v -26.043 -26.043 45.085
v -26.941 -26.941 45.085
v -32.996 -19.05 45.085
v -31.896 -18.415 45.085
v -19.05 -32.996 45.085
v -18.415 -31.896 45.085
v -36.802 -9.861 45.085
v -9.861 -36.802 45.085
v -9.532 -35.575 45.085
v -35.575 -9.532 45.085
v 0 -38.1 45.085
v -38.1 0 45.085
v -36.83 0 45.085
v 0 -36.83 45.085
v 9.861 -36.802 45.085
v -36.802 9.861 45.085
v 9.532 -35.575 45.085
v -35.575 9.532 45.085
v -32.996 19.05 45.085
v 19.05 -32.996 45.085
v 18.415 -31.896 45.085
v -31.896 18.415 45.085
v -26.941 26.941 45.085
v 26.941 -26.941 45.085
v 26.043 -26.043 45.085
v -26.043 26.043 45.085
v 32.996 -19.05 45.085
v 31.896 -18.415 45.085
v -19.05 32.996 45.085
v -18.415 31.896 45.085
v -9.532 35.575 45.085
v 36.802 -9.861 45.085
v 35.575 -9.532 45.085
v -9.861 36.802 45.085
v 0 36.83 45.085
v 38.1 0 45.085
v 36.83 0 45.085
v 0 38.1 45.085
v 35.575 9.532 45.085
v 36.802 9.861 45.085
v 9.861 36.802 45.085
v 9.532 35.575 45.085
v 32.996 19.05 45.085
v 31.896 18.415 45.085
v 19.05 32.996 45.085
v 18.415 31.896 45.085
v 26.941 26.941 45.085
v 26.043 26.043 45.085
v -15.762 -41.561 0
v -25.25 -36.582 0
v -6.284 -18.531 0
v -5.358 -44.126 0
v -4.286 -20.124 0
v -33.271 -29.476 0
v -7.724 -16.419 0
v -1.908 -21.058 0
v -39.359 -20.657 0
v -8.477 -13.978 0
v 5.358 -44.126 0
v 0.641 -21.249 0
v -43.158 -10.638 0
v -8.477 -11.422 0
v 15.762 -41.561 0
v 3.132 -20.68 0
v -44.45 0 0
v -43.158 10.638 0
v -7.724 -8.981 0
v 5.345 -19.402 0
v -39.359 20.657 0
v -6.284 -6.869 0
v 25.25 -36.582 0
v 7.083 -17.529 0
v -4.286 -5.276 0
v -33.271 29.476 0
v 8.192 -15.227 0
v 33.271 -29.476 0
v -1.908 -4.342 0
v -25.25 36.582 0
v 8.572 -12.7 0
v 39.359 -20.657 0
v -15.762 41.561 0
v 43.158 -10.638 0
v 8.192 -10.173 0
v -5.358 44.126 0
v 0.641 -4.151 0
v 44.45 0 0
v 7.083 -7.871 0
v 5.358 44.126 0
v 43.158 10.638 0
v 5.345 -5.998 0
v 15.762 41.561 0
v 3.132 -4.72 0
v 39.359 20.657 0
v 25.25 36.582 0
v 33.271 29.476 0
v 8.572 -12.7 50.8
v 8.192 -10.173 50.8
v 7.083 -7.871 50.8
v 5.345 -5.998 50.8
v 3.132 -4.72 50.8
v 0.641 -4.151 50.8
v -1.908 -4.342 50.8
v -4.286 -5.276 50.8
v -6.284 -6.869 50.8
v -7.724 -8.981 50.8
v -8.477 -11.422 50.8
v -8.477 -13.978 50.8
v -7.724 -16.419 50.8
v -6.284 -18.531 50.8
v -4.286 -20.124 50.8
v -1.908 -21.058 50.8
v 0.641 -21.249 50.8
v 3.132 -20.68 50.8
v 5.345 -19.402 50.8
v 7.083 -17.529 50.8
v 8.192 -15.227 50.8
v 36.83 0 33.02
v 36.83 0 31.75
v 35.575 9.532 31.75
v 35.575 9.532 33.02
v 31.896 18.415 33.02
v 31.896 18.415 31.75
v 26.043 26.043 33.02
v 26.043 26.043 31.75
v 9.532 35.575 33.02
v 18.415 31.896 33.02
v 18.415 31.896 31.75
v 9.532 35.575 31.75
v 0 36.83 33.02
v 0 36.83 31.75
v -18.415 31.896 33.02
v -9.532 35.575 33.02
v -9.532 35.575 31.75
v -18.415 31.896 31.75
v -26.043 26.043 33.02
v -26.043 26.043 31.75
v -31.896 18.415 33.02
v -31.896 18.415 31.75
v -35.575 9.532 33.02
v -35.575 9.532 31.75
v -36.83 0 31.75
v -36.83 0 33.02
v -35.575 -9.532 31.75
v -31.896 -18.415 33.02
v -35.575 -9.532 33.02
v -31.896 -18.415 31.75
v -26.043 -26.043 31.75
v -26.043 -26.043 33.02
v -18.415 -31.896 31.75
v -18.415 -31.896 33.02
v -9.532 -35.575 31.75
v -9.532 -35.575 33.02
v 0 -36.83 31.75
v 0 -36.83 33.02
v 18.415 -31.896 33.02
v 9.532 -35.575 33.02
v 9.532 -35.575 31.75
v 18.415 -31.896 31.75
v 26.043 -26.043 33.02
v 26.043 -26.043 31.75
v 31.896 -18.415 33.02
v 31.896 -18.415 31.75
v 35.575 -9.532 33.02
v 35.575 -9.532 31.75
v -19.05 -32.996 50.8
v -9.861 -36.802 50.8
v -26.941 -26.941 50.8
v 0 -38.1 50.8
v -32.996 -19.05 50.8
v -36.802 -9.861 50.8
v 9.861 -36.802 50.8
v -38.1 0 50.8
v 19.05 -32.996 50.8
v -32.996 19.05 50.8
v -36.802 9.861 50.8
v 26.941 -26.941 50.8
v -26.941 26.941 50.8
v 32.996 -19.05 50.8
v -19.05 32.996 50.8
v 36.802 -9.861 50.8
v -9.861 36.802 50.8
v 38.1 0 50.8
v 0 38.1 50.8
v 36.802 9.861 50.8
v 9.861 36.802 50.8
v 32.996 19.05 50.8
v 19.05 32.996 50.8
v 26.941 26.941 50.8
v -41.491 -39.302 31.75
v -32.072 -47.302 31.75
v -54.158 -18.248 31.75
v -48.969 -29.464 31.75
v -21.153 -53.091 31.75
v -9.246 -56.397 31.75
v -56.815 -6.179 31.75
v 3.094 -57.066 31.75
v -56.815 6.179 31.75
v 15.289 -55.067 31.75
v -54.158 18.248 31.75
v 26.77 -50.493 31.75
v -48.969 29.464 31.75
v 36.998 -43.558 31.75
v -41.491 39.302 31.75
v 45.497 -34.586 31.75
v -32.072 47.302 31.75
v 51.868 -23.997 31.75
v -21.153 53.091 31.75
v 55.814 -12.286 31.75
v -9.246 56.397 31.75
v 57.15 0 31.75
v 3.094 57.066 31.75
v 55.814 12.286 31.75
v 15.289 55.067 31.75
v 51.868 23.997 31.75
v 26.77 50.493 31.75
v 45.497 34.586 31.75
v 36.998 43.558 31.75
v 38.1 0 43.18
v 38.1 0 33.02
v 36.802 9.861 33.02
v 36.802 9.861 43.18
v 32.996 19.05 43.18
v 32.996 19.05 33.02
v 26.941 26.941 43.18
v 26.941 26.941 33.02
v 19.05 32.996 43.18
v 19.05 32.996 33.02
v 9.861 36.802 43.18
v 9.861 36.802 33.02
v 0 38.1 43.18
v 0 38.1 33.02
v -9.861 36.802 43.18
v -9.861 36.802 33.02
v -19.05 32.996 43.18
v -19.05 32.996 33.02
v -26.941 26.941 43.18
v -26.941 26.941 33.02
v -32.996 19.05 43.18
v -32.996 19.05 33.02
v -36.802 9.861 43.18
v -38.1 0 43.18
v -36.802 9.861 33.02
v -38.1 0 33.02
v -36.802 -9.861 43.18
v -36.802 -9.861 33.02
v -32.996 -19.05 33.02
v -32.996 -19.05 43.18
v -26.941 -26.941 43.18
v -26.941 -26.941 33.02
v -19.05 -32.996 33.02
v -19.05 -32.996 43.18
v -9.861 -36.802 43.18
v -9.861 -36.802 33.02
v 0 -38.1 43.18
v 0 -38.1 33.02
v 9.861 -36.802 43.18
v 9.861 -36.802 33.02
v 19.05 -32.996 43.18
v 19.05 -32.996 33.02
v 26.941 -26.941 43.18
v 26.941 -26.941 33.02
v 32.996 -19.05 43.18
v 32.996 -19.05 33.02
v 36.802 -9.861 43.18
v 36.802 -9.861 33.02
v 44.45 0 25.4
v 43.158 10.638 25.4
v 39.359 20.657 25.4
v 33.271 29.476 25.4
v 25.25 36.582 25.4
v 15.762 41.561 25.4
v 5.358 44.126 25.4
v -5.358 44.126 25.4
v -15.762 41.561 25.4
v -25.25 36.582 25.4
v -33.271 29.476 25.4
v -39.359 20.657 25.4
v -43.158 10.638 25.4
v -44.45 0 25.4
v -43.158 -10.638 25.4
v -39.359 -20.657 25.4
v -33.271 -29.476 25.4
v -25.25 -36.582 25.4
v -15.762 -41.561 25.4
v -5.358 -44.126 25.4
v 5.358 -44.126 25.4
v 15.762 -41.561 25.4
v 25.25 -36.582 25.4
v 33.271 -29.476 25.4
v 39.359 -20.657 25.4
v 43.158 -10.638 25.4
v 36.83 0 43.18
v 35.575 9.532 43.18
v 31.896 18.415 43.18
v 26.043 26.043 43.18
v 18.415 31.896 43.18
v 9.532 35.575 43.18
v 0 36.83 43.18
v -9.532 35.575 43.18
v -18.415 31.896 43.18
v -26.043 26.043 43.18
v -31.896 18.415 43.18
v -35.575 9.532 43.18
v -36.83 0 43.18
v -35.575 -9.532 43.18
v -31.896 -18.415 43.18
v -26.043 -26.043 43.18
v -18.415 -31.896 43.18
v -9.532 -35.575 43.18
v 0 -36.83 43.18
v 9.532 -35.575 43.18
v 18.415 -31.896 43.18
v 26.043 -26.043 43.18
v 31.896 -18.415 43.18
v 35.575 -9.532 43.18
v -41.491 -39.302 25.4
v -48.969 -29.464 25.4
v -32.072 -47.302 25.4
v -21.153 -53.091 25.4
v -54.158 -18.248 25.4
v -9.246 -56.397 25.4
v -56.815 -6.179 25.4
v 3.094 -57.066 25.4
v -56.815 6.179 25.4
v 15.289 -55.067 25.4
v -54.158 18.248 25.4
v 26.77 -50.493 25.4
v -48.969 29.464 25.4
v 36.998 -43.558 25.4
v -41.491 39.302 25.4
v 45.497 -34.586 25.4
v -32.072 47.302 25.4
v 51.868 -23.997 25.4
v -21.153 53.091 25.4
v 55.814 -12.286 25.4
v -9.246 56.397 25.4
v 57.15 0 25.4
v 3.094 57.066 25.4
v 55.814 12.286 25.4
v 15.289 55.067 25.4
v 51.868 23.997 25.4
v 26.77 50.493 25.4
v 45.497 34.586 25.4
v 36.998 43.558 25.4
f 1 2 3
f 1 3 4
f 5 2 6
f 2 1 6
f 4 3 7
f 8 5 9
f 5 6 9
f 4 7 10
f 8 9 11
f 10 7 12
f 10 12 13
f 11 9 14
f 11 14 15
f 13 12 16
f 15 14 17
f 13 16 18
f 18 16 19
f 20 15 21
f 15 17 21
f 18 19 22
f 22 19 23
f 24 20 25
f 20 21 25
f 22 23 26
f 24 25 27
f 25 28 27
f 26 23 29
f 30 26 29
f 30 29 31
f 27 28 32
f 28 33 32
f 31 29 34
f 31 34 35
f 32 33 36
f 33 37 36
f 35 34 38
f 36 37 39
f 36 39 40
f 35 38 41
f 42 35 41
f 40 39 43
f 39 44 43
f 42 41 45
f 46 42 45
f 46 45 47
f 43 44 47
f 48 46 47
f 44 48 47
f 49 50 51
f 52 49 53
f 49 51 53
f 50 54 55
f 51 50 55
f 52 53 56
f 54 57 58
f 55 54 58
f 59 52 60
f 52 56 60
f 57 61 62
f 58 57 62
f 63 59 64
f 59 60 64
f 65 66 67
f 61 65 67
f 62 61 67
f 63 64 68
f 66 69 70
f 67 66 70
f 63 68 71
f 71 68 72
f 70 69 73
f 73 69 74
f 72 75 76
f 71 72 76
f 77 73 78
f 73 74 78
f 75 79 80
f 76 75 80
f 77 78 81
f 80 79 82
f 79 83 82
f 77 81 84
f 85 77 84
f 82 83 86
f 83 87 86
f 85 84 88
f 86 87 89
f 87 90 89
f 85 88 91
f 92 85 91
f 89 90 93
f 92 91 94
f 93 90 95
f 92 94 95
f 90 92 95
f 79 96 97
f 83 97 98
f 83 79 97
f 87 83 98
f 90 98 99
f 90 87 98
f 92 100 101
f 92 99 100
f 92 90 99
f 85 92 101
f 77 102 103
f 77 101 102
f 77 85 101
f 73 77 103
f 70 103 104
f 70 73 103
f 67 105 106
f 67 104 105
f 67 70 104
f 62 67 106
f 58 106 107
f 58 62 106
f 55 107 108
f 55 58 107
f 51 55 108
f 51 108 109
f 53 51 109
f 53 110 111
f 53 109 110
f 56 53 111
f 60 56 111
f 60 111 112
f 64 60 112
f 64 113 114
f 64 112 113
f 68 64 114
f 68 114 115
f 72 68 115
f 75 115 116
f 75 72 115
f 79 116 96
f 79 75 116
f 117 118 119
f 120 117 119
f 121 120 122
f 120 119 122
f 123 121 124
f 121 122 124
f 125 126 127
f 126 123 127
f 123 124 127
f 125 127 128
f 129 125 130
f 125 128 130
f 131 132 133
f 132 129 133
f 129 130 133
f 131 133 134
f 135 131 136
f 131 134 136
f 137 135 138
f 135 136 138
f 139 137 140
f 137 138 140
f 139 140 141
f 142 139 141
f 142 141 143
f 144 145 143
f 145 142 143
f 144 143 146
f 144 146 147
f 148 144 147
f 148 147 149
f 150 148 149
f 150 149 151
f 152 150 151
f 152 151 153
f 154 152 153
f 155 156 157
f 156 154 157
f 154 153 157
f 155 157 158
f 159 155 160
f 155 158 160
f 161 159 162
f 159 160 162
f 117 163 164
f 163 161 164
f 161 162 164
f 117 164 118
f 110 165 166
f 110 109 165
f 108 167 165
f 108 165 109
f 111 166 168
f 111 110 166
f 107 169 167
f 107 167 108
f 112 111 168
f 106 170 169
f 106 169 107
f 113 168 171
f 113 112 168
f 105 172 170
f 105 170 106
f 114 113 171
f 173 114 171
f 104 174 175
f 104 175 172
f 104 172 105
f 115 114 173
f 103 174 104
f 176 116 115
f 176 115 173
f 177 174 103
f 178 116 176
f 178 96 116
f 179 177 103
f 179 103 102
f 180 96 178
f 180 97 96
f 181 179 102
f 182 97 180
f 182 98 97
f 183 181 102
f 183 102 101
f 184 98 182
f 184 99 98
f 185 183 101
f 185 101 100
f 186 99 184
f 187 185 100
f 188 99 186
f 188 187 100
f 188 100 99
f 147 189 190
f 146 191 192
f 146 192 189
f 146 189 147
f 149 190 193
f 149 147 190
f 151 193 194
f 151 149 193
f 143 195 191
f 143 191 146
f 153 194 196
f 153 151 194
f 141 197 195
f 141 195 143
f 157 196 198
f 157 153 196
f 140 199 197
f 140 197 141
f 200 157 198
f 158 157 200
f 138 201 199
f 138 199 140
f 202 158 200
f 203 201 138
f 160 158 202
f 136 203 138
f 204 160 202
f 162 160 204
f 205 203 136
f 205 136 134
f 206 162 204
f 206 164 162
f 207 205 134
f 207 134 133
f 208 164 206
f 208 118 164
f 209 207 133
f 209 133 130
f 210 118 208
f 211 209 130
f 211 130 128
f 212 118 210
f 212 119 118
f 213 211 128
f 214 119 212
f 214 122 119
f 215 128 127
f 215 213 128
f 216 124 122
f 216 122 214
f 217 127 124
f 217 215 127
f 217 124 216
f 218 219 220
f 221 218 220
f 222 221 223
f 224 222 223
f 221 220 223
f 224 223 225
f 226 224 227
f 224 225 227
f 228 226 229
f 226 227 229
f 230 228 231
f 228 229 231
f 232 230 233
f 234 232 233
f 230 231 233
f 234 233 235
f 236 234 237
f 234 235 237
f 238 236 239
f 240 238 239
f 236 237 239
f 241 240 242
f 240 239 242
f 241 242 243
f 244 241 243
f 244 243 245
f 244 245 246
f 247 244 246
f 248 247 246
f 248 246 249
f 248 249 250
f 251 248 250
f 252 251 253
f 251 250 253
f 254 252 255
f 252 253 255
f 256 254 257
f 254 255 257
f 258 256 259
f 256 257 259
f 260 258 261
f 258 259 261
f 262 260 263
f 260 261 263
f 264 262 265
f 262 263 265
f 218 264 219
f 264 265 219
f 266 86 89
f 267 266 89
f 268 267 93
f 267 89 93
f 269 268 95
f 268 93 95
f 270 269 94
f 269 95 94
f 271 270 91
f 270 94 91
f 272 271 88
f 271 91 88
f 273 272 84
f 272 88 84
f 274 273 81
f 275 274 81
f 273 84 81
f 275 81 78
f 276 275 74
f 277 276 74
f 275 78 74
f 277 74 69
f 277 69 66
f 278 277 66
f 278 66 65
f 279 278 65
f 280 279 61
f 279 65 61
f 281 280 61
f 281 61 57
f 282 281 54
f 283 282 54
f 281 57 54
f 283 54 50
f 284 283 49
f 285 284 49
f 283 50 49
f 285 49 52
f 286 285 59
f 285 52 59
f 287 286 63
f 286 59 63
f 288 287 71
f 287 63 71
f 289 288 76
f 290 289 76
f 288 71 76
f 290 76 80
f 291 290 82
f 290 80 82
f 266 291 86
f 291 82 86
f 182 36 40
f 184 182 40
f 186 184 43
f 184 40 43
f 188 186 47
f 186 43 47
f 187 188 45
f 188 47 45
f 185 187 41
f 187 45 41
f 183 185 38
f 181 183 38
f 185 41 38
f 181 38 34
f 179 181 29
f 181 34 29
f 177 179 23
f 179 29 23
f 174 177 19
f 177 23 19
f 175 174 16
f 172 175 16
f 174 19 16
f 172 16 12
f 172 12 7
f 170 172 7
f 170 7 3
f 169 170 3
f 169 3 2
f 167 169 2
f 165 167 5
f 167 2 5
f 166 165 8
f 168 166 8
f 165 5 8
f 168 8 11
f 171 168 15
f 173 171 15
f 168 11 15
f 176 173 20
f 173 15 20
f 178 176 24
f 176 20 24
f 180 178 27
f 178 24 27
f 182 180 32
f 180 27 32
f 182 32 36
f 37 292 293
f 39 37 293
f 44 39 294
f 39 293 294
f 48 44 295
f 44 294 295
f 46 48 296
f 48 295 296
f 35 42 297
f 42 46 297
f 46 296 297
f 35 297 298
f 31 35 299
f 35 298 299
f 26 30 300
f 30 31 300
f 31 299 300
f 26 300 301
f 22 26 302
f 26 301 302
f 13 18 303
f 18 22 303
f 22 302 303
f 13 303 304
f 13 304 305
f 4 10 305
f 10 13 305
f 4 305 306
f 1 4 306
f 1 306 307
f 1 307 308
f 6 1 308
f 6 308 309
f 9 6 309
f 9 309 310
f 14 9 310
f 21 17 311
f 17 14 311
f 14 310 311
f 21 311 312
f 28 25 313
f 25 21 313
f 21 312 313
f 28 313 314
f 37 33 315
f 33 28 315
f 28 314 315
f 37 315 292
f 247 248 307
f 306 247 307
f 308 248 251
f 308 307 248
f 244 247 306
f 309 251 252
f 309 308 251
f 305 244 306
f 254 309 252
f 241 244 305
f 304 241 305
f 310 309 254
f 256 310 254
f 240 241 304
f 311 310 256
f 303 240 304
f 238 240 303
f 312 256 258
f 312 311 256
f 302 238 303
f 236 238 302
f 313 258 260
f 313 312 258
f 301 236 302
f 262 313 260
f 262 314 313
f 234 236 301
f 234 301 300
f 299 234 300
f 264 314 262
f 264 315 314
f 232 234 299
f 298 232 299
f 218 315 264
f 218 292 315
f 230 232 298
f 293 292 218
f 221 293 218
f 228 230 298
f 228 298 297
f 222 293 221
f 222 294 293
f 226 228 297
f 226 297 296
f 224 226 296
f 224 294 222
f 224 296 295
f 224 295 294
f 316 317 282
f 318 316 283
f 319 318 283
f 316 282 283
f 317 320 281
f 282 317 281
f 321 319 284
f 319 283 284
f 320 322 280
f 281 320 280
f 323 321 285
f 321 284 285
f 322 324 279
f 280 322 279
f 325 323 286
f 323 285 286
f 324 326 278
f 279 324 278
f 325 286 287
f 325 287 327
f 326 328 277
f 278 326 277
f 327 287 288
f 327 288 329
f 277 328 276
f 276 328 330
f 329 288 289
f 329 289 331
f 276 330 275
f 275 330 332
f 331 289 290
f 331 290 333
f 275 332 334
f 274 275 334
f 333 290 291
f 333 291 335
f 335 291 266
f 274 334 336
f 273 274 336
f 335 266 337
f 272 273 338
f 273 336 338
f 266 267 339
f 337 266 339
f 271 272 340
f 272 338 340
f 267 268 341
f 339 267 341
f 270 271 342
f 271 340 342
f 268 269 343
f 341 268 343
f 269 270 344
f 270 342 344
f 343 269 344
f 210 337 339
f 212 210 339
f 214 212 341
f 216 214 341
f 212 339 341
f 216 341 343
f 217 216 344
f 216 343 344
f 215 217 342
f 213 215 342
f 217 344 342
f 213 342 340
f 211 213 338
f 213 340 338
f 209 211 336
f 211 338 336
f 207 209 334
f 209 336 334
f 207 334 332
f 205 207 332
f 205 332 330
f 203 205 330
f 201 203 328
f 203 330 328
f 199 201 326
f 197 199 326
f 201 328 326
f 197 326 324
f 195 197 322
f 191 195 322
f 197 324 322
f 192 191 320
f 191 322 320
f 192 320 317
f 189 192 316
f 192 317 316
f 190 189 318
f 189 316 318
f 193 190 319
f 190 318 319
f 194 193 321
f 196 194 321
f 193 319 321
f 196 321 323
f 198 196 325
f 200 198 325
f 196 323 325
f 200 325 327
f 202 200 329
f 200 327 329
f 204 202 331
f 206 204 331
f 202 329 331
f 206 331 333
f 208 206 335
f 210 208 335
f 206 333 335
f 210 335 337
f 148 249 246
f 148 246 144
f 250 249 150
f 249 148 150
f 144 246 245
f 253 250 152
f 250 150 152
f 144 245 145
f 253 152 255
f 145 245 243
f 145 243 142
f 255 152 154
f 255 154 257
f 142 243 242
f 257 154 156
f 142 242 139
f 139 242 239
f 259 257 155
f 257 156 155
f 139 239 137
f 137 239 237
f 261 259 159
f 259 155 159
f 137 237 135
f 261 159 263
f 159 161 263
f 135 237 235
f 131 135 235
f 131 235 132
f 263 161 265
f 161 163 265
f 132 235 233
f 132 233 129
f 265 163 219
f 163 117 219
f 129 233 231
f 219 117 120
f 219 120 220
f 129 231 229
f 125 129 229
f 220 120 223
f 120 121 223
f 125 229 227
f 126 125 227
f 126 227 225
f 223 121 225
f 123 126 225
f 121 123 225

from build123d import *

# Parameters (mm, degrees)
SKETCH1_R               = 44.45
BOSS_EXTRUDE1_DEPTH     = 25.4
SKETCH2_R               = 36.83
BOSS_EXTRUDE2_DEPTH     = 25.4
SKETCH7_R               = 38.1
BOSS_EXTRUDE3_DEPTH     = 5.715
BOSS_EXTRUDE4_START     = -5.715
SKETCH8_R               = 38.1
BOSS_EXTRUDE4_DEPTH     = 5.715
BOSS_EXTRUDE6_START     = 7.62
SKETCH11_R              = 38.1
BOSS_EXTRUDE6_DEPTH     = 10.16
SKETCH12_R              = 57.15
BOSS_EXTRUDE7_DEPTH     = 6.35
CUT_EXTRUDE1_DEPTH      = 96.461432003
CUT_EXTRUDE1_DEPTH_BACK = 96.461432003
SKETCH3_R               = 8.5725


with BuildPart() as part:
    # Sketch1 → Boss-Extrude1 (new body)
    with BuildSketch(Plane.XY):
        Circle(SKETCH1_R)
    extrude(amount=BOSS_EXTRUDE1_DEPTH)

    # Sketch2 → Boss-Extrude2 (add)
    with BuildSketch(Plane.XY.offset(25.4)):
        Circle(SKETCH2_R)
    extrude(amount=BOSS_EXTRUDE2_DEPTH)

    # Sketch7 → Boss-Extrude3 (add)
    with BuildSketch(Plane.XY.offset(25.4)):
        Circle(SKETCH7_R)
    extrude(amount=BOSS_EXTRUDE3_DEPTH)

    # Sketch8 → Boss-Extrude4 (add)
    with BuildSketch(Plane.XY.offset(50.8).offset(BOSS_EXTRUDE4_START)):
        Circle(SKETCH8_R)
    extrude(amount=BOSS_EXTRUDE4_DEPTH)

    # Sketch11 → Boss-Extrude6 (add)
    with BuildSketch(Plane.XY.offset(25.4).offset(BOSS_EXTRUDE6_START)):
        Circle(SKETCH11_R)
    extrude(amount=BOSS_EXTRUDE6_DEPTH)

    # Sketch12 → Boss-Extrude7 (add)
    with BuildSketch(Plane.XY.offset(25.4)):
        Circle(SKETCH12_R)
    extrude(amount=BOSS_EXTRUDE7_DEPTH)

    # Sketch3 → Cut-Extrude1 (cut, two sides: drawn at the far end of the back side and taken through both)
    with BuildSketch(Plane.XY.offset(50.8).offset(-CUT_EXTRUDE1_DEPTH_BACK)):
        with Locations((0, -12.7)):
            Circle(SKETCH3_R)
    extrude(amount=CUT_EXTRUDE1_DEPTH + CUT_EXTRUDE1_DEPTH_BACK, mode=Mode.SUBTRACT)


solid = part.part
